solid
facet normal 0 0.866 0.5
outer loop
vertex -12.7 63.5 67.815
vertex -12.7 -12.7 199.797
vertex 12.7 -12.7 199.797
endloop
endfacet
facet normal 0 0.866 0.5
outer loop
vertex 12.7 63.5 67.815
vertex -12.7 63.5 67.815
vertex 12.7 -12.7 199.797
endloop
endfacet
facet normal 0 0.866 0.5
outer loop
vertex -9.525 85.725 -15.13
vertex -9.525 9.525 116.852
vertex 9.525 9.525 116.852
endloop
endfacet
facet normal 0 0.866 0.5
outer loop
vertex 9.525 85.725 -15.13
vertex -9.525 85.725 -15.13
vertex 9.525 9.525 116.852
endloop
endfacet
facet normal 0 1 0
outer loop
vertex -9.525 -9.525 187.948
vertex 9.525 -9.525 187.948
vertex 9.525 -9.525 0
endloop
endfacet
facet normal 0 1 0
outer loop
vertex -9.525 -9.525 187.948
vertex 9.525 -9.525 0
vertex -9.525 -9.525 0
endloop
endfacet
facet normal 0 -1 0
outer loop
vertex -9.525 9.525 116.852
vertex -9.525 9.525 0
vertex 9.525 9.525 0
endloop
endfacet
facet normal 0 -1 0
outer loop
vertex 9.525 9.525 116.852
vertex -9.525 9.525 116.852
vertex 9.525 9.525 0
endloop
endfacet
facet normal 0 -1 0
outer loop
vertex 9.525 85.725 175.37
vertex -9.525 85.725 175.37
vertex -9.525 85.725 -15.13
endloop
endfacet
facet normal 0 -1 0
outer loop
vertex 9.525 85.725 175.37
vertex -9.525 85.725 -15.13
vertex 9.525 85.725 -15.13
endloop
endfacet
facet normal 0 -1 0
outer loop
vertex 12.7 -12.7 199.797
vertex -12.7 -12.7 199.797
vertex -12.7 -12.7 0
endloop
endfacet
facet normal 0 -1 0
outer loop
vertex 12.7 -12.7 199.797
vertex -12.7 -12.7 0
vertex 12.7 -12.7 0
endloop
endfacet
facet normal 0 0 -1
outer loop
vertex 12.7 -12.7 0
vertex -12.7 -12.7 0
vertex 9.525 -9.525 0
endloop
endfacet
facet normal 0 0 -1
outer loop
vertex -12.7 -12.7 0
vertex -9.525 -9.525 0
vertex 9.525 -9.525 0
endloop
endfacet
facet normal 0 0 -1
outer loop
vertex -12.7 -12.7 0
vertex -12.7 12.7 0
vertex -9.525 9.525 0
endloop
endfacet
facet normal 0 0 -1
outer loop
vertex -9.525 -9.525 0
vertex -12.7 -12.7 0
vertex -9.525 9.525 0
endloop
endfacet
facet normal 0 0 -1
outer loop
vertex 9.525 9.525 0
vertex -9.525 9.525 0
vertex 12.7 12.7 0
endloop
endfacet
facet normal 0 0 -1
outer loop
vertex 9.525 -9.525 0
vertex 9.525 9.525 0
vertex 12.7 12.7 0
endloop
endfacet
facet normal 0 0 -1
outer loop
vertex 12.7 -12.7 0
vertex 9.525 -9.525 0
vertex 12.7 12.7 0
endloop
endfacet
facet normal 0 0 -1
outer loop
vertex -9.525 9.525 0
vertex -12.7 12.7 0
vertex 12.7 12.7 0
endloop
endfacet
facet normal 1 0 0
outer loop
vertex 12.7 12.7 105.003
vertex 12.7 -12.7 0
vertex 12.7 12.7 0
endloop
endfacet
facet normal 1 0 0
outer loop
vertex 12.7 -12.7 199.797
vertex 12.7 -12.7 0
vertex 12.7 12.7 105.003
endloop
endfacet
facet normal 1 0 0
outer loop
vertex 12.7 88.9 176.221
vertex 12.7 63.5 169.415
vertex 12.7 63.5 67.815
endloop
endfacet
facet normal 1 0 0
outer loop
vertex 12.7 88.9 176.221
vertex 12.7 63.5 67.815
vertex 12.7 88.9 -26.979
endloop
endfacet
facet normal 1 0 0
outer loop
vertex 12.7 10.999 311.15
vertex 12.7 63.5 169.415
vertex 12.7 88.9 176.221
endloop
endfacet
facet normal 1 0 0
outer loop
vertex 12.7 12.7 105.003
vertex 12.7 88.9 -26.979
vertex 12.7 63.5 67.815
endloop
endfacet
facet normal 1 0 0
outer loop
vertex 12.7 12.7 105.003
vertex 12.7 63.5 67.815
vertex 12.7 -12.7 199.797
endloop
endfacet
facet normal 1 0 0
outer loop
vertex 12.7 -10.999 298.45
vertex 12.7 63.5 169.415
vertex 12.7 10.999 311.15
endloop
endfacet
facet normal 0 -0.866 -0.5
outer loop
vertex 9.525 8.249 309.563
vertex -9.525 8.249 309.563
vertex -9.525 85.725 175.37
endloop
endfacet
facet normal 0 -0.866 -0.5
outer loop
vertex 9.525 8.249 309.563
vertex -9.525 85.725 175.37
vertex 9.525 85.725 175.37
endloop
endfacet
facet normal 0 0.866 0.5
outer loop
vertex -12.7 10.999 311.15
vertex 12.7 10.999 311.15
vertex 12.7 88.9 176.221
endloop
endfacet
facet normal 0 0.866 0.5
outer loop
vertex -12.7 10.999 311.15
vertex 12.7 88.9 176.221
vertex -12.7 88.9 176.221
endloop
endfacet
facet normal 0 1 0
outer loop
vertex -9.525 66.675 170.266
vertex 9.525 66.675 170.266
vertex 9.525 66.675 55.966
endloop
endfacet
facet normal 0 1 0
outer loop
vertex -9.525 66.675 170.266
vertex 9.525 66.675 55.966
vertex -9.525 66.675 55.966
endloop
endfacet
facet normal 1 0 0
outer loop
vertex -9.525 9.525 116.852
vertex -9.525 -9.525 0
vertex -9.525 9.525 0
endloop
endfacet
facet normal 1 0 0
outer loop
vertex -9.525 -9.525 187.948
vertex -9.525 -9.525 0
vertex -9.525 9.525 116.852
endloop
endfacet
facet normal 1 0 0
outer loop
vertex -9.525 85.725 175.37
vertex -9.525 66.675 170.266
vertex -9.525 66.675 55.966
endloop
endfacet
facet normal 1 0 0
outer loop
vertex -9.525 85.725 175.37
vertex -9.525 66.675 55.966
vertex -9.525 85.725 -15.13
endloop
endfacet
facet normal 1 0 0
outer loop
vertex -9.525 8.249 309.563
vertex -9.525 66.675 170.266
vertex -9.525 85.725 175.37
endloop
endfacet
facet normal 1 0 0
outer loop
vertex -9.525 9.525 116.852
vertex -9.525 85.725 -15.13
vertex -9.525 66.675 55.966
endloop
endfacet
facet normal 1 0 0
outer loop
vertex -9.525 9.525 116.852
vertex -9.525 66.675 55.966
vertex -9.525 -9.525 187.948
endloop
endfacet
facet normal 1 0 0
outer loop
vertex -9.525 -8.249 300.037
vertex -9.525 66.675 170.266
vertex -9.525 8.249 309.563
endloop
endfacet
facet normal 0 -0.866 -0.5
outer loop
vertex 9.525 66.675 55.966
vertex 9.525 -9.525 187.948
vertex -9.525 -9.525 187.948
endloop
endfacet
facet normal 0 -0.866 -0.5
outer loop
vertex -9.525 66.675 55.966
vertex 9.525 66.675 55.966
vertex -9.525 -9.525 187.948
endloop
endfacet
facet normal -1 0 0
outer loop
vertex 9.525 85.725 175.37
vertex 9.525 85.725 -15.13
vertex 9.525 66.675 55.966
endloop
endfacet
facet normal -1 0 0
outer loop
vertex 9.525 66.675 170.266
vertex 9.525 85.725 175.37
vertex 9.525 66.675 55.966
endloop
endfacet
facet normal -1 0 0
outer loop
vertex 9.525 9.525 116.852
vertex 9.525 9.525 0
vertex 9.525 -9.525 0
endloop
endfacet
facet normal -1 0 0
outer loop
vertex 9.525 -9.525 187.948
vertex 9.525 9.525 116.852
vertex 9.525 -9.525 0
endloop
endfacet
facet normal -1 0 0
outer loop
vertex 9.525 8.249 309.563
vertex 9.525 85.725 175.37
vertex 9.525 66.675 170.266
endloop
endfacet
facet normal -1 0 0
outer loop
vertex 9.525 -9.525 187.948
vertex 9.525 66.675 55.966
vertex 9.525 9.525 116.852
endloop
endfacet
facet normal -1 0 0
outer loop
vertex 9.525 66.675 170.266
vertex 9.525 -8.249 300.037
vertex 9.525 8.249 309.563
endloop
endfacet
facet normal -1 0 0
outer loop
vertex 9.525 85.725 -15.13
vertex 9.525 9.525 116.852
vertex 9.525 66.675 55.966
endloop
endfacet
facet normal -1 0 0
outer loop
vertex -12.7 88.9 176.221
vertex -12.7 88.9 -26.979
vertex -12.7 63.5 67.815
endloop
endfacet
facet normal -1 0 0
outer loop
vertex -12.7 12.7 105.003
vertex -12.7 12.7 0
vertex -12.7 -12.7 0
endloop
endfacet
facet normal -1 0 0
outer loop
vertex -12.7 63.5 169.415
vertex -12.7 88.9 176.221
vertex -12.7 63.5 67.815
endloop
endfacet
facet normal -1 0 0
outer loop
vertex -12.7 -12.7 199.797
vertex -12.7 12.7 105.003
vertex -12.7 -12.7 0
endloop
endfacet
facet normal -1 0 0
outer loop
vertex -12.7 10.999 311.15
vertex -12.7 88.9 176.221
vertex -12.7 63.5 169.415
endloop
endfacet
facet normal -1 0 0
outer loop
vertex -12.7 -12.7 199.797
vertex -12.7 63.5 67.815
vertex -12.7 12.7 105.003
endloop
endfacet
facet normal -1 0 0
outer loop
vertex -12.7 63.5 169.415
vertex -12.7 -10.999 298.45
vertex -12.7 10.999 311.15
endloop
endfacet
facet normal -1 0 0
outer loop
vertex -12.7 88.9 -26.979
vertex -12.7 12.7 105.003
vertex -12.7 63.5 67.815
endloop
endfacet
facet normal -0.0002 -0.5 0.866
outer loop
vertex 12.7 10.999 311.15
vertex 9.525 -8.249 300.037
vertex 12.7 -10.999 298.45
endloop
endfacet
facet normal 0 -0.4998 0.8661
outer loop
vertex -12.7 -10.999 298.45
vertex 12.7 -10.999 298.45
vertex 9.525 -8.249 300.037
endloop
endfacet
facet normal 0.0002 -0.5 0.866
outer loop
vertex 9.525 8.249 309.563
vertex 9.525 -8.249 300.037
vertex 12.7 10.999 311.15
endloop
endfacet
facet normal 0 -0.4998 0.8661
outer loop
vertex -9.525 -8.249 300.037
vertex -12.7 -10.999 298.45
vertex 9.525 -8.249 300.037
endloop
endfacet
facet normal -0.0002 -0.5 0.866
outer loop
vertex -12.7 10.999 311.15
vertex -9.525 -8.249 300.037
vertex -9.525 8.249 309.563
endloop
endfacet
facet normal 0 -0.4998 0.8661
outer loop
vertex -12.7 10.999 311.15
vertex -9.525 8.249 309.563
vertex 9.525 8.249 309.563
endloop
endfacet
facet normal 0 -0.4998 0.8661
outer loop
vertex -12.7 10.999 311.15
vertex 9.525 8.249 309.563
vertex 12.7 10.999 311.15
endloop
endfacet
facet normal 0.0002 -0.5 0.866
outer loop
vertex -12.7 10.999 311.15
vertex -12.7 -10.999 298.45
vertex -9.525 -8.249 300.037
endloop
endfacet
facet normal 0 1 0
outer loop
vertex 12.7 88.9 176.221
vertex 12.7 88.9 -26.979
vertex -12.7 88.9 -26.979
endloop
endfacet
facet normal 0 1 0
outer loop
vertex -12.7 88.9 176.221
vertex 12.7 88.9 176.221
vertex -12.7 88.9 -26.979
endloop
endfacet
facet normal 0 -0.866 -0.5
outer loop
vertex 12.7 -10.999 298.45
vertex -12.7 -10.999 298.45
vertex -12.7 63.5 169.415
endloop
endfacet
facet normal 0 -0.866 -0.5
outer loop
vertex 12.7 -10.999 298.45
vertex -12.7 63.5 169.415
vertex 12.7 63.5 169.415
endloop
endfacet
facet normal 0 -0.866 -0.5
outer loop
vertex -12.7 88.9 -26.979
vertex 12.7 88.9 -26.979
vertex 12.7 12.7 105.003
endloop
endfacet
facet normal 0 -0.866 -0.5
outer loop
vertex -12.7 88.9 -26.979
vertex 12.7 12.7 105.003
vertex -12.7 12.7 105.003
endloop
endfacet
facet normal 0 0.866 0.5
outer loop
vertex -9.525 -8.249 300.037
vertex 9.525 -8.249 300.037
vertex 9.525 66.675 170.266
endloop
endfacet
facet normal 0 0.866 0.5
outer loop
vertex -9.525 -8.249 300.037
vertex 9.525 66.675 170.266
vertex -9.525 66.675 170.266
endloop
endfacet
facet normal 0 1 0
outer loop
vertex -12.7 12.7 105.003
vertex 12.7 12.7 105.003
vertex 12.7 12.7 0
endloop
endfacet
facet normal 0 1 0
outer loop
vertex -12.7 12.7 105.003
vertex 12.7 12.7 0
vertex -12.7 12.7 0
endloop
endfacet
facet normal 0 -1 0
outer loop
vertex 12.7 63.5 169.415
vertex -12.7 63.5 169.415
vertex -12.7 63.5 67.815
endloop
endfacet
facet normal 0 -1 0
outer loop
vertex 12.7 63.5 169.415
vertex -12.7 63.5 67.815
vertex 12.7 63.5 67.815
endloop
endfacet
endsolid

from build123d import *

# Parameters (mm, degrees)
F0_W   = 25.4
F0_H   = 25.4
F0_W_2 = 19.05
F0_H_2 = 19.05


with BuildPart() as f2:
    # F2: sweep along a path in F1
    with BuildLine(Plane.YZ) as f2_path:
        Line((0, 0), (0, 152.4))
        Line((0, 152.4), (76.2, 20.4177284633))
        Line((76.2, 20.4177284633), (76.2, 172.8177284633))
        Line((76.2, 172.8177284633), (0, 304.8))
    # F0 (on Top) → F2 (sweep)
    with BuildSketch(Plane.XY):
        Rectangle(F0_W, F0_H)
        Rectangle(F0_W_2, F0_H_2, mode=Mode.SUBTRACT)
    sweep(path=f2_path.line, transition=Transition.RIGHT)


solid = f2.part
